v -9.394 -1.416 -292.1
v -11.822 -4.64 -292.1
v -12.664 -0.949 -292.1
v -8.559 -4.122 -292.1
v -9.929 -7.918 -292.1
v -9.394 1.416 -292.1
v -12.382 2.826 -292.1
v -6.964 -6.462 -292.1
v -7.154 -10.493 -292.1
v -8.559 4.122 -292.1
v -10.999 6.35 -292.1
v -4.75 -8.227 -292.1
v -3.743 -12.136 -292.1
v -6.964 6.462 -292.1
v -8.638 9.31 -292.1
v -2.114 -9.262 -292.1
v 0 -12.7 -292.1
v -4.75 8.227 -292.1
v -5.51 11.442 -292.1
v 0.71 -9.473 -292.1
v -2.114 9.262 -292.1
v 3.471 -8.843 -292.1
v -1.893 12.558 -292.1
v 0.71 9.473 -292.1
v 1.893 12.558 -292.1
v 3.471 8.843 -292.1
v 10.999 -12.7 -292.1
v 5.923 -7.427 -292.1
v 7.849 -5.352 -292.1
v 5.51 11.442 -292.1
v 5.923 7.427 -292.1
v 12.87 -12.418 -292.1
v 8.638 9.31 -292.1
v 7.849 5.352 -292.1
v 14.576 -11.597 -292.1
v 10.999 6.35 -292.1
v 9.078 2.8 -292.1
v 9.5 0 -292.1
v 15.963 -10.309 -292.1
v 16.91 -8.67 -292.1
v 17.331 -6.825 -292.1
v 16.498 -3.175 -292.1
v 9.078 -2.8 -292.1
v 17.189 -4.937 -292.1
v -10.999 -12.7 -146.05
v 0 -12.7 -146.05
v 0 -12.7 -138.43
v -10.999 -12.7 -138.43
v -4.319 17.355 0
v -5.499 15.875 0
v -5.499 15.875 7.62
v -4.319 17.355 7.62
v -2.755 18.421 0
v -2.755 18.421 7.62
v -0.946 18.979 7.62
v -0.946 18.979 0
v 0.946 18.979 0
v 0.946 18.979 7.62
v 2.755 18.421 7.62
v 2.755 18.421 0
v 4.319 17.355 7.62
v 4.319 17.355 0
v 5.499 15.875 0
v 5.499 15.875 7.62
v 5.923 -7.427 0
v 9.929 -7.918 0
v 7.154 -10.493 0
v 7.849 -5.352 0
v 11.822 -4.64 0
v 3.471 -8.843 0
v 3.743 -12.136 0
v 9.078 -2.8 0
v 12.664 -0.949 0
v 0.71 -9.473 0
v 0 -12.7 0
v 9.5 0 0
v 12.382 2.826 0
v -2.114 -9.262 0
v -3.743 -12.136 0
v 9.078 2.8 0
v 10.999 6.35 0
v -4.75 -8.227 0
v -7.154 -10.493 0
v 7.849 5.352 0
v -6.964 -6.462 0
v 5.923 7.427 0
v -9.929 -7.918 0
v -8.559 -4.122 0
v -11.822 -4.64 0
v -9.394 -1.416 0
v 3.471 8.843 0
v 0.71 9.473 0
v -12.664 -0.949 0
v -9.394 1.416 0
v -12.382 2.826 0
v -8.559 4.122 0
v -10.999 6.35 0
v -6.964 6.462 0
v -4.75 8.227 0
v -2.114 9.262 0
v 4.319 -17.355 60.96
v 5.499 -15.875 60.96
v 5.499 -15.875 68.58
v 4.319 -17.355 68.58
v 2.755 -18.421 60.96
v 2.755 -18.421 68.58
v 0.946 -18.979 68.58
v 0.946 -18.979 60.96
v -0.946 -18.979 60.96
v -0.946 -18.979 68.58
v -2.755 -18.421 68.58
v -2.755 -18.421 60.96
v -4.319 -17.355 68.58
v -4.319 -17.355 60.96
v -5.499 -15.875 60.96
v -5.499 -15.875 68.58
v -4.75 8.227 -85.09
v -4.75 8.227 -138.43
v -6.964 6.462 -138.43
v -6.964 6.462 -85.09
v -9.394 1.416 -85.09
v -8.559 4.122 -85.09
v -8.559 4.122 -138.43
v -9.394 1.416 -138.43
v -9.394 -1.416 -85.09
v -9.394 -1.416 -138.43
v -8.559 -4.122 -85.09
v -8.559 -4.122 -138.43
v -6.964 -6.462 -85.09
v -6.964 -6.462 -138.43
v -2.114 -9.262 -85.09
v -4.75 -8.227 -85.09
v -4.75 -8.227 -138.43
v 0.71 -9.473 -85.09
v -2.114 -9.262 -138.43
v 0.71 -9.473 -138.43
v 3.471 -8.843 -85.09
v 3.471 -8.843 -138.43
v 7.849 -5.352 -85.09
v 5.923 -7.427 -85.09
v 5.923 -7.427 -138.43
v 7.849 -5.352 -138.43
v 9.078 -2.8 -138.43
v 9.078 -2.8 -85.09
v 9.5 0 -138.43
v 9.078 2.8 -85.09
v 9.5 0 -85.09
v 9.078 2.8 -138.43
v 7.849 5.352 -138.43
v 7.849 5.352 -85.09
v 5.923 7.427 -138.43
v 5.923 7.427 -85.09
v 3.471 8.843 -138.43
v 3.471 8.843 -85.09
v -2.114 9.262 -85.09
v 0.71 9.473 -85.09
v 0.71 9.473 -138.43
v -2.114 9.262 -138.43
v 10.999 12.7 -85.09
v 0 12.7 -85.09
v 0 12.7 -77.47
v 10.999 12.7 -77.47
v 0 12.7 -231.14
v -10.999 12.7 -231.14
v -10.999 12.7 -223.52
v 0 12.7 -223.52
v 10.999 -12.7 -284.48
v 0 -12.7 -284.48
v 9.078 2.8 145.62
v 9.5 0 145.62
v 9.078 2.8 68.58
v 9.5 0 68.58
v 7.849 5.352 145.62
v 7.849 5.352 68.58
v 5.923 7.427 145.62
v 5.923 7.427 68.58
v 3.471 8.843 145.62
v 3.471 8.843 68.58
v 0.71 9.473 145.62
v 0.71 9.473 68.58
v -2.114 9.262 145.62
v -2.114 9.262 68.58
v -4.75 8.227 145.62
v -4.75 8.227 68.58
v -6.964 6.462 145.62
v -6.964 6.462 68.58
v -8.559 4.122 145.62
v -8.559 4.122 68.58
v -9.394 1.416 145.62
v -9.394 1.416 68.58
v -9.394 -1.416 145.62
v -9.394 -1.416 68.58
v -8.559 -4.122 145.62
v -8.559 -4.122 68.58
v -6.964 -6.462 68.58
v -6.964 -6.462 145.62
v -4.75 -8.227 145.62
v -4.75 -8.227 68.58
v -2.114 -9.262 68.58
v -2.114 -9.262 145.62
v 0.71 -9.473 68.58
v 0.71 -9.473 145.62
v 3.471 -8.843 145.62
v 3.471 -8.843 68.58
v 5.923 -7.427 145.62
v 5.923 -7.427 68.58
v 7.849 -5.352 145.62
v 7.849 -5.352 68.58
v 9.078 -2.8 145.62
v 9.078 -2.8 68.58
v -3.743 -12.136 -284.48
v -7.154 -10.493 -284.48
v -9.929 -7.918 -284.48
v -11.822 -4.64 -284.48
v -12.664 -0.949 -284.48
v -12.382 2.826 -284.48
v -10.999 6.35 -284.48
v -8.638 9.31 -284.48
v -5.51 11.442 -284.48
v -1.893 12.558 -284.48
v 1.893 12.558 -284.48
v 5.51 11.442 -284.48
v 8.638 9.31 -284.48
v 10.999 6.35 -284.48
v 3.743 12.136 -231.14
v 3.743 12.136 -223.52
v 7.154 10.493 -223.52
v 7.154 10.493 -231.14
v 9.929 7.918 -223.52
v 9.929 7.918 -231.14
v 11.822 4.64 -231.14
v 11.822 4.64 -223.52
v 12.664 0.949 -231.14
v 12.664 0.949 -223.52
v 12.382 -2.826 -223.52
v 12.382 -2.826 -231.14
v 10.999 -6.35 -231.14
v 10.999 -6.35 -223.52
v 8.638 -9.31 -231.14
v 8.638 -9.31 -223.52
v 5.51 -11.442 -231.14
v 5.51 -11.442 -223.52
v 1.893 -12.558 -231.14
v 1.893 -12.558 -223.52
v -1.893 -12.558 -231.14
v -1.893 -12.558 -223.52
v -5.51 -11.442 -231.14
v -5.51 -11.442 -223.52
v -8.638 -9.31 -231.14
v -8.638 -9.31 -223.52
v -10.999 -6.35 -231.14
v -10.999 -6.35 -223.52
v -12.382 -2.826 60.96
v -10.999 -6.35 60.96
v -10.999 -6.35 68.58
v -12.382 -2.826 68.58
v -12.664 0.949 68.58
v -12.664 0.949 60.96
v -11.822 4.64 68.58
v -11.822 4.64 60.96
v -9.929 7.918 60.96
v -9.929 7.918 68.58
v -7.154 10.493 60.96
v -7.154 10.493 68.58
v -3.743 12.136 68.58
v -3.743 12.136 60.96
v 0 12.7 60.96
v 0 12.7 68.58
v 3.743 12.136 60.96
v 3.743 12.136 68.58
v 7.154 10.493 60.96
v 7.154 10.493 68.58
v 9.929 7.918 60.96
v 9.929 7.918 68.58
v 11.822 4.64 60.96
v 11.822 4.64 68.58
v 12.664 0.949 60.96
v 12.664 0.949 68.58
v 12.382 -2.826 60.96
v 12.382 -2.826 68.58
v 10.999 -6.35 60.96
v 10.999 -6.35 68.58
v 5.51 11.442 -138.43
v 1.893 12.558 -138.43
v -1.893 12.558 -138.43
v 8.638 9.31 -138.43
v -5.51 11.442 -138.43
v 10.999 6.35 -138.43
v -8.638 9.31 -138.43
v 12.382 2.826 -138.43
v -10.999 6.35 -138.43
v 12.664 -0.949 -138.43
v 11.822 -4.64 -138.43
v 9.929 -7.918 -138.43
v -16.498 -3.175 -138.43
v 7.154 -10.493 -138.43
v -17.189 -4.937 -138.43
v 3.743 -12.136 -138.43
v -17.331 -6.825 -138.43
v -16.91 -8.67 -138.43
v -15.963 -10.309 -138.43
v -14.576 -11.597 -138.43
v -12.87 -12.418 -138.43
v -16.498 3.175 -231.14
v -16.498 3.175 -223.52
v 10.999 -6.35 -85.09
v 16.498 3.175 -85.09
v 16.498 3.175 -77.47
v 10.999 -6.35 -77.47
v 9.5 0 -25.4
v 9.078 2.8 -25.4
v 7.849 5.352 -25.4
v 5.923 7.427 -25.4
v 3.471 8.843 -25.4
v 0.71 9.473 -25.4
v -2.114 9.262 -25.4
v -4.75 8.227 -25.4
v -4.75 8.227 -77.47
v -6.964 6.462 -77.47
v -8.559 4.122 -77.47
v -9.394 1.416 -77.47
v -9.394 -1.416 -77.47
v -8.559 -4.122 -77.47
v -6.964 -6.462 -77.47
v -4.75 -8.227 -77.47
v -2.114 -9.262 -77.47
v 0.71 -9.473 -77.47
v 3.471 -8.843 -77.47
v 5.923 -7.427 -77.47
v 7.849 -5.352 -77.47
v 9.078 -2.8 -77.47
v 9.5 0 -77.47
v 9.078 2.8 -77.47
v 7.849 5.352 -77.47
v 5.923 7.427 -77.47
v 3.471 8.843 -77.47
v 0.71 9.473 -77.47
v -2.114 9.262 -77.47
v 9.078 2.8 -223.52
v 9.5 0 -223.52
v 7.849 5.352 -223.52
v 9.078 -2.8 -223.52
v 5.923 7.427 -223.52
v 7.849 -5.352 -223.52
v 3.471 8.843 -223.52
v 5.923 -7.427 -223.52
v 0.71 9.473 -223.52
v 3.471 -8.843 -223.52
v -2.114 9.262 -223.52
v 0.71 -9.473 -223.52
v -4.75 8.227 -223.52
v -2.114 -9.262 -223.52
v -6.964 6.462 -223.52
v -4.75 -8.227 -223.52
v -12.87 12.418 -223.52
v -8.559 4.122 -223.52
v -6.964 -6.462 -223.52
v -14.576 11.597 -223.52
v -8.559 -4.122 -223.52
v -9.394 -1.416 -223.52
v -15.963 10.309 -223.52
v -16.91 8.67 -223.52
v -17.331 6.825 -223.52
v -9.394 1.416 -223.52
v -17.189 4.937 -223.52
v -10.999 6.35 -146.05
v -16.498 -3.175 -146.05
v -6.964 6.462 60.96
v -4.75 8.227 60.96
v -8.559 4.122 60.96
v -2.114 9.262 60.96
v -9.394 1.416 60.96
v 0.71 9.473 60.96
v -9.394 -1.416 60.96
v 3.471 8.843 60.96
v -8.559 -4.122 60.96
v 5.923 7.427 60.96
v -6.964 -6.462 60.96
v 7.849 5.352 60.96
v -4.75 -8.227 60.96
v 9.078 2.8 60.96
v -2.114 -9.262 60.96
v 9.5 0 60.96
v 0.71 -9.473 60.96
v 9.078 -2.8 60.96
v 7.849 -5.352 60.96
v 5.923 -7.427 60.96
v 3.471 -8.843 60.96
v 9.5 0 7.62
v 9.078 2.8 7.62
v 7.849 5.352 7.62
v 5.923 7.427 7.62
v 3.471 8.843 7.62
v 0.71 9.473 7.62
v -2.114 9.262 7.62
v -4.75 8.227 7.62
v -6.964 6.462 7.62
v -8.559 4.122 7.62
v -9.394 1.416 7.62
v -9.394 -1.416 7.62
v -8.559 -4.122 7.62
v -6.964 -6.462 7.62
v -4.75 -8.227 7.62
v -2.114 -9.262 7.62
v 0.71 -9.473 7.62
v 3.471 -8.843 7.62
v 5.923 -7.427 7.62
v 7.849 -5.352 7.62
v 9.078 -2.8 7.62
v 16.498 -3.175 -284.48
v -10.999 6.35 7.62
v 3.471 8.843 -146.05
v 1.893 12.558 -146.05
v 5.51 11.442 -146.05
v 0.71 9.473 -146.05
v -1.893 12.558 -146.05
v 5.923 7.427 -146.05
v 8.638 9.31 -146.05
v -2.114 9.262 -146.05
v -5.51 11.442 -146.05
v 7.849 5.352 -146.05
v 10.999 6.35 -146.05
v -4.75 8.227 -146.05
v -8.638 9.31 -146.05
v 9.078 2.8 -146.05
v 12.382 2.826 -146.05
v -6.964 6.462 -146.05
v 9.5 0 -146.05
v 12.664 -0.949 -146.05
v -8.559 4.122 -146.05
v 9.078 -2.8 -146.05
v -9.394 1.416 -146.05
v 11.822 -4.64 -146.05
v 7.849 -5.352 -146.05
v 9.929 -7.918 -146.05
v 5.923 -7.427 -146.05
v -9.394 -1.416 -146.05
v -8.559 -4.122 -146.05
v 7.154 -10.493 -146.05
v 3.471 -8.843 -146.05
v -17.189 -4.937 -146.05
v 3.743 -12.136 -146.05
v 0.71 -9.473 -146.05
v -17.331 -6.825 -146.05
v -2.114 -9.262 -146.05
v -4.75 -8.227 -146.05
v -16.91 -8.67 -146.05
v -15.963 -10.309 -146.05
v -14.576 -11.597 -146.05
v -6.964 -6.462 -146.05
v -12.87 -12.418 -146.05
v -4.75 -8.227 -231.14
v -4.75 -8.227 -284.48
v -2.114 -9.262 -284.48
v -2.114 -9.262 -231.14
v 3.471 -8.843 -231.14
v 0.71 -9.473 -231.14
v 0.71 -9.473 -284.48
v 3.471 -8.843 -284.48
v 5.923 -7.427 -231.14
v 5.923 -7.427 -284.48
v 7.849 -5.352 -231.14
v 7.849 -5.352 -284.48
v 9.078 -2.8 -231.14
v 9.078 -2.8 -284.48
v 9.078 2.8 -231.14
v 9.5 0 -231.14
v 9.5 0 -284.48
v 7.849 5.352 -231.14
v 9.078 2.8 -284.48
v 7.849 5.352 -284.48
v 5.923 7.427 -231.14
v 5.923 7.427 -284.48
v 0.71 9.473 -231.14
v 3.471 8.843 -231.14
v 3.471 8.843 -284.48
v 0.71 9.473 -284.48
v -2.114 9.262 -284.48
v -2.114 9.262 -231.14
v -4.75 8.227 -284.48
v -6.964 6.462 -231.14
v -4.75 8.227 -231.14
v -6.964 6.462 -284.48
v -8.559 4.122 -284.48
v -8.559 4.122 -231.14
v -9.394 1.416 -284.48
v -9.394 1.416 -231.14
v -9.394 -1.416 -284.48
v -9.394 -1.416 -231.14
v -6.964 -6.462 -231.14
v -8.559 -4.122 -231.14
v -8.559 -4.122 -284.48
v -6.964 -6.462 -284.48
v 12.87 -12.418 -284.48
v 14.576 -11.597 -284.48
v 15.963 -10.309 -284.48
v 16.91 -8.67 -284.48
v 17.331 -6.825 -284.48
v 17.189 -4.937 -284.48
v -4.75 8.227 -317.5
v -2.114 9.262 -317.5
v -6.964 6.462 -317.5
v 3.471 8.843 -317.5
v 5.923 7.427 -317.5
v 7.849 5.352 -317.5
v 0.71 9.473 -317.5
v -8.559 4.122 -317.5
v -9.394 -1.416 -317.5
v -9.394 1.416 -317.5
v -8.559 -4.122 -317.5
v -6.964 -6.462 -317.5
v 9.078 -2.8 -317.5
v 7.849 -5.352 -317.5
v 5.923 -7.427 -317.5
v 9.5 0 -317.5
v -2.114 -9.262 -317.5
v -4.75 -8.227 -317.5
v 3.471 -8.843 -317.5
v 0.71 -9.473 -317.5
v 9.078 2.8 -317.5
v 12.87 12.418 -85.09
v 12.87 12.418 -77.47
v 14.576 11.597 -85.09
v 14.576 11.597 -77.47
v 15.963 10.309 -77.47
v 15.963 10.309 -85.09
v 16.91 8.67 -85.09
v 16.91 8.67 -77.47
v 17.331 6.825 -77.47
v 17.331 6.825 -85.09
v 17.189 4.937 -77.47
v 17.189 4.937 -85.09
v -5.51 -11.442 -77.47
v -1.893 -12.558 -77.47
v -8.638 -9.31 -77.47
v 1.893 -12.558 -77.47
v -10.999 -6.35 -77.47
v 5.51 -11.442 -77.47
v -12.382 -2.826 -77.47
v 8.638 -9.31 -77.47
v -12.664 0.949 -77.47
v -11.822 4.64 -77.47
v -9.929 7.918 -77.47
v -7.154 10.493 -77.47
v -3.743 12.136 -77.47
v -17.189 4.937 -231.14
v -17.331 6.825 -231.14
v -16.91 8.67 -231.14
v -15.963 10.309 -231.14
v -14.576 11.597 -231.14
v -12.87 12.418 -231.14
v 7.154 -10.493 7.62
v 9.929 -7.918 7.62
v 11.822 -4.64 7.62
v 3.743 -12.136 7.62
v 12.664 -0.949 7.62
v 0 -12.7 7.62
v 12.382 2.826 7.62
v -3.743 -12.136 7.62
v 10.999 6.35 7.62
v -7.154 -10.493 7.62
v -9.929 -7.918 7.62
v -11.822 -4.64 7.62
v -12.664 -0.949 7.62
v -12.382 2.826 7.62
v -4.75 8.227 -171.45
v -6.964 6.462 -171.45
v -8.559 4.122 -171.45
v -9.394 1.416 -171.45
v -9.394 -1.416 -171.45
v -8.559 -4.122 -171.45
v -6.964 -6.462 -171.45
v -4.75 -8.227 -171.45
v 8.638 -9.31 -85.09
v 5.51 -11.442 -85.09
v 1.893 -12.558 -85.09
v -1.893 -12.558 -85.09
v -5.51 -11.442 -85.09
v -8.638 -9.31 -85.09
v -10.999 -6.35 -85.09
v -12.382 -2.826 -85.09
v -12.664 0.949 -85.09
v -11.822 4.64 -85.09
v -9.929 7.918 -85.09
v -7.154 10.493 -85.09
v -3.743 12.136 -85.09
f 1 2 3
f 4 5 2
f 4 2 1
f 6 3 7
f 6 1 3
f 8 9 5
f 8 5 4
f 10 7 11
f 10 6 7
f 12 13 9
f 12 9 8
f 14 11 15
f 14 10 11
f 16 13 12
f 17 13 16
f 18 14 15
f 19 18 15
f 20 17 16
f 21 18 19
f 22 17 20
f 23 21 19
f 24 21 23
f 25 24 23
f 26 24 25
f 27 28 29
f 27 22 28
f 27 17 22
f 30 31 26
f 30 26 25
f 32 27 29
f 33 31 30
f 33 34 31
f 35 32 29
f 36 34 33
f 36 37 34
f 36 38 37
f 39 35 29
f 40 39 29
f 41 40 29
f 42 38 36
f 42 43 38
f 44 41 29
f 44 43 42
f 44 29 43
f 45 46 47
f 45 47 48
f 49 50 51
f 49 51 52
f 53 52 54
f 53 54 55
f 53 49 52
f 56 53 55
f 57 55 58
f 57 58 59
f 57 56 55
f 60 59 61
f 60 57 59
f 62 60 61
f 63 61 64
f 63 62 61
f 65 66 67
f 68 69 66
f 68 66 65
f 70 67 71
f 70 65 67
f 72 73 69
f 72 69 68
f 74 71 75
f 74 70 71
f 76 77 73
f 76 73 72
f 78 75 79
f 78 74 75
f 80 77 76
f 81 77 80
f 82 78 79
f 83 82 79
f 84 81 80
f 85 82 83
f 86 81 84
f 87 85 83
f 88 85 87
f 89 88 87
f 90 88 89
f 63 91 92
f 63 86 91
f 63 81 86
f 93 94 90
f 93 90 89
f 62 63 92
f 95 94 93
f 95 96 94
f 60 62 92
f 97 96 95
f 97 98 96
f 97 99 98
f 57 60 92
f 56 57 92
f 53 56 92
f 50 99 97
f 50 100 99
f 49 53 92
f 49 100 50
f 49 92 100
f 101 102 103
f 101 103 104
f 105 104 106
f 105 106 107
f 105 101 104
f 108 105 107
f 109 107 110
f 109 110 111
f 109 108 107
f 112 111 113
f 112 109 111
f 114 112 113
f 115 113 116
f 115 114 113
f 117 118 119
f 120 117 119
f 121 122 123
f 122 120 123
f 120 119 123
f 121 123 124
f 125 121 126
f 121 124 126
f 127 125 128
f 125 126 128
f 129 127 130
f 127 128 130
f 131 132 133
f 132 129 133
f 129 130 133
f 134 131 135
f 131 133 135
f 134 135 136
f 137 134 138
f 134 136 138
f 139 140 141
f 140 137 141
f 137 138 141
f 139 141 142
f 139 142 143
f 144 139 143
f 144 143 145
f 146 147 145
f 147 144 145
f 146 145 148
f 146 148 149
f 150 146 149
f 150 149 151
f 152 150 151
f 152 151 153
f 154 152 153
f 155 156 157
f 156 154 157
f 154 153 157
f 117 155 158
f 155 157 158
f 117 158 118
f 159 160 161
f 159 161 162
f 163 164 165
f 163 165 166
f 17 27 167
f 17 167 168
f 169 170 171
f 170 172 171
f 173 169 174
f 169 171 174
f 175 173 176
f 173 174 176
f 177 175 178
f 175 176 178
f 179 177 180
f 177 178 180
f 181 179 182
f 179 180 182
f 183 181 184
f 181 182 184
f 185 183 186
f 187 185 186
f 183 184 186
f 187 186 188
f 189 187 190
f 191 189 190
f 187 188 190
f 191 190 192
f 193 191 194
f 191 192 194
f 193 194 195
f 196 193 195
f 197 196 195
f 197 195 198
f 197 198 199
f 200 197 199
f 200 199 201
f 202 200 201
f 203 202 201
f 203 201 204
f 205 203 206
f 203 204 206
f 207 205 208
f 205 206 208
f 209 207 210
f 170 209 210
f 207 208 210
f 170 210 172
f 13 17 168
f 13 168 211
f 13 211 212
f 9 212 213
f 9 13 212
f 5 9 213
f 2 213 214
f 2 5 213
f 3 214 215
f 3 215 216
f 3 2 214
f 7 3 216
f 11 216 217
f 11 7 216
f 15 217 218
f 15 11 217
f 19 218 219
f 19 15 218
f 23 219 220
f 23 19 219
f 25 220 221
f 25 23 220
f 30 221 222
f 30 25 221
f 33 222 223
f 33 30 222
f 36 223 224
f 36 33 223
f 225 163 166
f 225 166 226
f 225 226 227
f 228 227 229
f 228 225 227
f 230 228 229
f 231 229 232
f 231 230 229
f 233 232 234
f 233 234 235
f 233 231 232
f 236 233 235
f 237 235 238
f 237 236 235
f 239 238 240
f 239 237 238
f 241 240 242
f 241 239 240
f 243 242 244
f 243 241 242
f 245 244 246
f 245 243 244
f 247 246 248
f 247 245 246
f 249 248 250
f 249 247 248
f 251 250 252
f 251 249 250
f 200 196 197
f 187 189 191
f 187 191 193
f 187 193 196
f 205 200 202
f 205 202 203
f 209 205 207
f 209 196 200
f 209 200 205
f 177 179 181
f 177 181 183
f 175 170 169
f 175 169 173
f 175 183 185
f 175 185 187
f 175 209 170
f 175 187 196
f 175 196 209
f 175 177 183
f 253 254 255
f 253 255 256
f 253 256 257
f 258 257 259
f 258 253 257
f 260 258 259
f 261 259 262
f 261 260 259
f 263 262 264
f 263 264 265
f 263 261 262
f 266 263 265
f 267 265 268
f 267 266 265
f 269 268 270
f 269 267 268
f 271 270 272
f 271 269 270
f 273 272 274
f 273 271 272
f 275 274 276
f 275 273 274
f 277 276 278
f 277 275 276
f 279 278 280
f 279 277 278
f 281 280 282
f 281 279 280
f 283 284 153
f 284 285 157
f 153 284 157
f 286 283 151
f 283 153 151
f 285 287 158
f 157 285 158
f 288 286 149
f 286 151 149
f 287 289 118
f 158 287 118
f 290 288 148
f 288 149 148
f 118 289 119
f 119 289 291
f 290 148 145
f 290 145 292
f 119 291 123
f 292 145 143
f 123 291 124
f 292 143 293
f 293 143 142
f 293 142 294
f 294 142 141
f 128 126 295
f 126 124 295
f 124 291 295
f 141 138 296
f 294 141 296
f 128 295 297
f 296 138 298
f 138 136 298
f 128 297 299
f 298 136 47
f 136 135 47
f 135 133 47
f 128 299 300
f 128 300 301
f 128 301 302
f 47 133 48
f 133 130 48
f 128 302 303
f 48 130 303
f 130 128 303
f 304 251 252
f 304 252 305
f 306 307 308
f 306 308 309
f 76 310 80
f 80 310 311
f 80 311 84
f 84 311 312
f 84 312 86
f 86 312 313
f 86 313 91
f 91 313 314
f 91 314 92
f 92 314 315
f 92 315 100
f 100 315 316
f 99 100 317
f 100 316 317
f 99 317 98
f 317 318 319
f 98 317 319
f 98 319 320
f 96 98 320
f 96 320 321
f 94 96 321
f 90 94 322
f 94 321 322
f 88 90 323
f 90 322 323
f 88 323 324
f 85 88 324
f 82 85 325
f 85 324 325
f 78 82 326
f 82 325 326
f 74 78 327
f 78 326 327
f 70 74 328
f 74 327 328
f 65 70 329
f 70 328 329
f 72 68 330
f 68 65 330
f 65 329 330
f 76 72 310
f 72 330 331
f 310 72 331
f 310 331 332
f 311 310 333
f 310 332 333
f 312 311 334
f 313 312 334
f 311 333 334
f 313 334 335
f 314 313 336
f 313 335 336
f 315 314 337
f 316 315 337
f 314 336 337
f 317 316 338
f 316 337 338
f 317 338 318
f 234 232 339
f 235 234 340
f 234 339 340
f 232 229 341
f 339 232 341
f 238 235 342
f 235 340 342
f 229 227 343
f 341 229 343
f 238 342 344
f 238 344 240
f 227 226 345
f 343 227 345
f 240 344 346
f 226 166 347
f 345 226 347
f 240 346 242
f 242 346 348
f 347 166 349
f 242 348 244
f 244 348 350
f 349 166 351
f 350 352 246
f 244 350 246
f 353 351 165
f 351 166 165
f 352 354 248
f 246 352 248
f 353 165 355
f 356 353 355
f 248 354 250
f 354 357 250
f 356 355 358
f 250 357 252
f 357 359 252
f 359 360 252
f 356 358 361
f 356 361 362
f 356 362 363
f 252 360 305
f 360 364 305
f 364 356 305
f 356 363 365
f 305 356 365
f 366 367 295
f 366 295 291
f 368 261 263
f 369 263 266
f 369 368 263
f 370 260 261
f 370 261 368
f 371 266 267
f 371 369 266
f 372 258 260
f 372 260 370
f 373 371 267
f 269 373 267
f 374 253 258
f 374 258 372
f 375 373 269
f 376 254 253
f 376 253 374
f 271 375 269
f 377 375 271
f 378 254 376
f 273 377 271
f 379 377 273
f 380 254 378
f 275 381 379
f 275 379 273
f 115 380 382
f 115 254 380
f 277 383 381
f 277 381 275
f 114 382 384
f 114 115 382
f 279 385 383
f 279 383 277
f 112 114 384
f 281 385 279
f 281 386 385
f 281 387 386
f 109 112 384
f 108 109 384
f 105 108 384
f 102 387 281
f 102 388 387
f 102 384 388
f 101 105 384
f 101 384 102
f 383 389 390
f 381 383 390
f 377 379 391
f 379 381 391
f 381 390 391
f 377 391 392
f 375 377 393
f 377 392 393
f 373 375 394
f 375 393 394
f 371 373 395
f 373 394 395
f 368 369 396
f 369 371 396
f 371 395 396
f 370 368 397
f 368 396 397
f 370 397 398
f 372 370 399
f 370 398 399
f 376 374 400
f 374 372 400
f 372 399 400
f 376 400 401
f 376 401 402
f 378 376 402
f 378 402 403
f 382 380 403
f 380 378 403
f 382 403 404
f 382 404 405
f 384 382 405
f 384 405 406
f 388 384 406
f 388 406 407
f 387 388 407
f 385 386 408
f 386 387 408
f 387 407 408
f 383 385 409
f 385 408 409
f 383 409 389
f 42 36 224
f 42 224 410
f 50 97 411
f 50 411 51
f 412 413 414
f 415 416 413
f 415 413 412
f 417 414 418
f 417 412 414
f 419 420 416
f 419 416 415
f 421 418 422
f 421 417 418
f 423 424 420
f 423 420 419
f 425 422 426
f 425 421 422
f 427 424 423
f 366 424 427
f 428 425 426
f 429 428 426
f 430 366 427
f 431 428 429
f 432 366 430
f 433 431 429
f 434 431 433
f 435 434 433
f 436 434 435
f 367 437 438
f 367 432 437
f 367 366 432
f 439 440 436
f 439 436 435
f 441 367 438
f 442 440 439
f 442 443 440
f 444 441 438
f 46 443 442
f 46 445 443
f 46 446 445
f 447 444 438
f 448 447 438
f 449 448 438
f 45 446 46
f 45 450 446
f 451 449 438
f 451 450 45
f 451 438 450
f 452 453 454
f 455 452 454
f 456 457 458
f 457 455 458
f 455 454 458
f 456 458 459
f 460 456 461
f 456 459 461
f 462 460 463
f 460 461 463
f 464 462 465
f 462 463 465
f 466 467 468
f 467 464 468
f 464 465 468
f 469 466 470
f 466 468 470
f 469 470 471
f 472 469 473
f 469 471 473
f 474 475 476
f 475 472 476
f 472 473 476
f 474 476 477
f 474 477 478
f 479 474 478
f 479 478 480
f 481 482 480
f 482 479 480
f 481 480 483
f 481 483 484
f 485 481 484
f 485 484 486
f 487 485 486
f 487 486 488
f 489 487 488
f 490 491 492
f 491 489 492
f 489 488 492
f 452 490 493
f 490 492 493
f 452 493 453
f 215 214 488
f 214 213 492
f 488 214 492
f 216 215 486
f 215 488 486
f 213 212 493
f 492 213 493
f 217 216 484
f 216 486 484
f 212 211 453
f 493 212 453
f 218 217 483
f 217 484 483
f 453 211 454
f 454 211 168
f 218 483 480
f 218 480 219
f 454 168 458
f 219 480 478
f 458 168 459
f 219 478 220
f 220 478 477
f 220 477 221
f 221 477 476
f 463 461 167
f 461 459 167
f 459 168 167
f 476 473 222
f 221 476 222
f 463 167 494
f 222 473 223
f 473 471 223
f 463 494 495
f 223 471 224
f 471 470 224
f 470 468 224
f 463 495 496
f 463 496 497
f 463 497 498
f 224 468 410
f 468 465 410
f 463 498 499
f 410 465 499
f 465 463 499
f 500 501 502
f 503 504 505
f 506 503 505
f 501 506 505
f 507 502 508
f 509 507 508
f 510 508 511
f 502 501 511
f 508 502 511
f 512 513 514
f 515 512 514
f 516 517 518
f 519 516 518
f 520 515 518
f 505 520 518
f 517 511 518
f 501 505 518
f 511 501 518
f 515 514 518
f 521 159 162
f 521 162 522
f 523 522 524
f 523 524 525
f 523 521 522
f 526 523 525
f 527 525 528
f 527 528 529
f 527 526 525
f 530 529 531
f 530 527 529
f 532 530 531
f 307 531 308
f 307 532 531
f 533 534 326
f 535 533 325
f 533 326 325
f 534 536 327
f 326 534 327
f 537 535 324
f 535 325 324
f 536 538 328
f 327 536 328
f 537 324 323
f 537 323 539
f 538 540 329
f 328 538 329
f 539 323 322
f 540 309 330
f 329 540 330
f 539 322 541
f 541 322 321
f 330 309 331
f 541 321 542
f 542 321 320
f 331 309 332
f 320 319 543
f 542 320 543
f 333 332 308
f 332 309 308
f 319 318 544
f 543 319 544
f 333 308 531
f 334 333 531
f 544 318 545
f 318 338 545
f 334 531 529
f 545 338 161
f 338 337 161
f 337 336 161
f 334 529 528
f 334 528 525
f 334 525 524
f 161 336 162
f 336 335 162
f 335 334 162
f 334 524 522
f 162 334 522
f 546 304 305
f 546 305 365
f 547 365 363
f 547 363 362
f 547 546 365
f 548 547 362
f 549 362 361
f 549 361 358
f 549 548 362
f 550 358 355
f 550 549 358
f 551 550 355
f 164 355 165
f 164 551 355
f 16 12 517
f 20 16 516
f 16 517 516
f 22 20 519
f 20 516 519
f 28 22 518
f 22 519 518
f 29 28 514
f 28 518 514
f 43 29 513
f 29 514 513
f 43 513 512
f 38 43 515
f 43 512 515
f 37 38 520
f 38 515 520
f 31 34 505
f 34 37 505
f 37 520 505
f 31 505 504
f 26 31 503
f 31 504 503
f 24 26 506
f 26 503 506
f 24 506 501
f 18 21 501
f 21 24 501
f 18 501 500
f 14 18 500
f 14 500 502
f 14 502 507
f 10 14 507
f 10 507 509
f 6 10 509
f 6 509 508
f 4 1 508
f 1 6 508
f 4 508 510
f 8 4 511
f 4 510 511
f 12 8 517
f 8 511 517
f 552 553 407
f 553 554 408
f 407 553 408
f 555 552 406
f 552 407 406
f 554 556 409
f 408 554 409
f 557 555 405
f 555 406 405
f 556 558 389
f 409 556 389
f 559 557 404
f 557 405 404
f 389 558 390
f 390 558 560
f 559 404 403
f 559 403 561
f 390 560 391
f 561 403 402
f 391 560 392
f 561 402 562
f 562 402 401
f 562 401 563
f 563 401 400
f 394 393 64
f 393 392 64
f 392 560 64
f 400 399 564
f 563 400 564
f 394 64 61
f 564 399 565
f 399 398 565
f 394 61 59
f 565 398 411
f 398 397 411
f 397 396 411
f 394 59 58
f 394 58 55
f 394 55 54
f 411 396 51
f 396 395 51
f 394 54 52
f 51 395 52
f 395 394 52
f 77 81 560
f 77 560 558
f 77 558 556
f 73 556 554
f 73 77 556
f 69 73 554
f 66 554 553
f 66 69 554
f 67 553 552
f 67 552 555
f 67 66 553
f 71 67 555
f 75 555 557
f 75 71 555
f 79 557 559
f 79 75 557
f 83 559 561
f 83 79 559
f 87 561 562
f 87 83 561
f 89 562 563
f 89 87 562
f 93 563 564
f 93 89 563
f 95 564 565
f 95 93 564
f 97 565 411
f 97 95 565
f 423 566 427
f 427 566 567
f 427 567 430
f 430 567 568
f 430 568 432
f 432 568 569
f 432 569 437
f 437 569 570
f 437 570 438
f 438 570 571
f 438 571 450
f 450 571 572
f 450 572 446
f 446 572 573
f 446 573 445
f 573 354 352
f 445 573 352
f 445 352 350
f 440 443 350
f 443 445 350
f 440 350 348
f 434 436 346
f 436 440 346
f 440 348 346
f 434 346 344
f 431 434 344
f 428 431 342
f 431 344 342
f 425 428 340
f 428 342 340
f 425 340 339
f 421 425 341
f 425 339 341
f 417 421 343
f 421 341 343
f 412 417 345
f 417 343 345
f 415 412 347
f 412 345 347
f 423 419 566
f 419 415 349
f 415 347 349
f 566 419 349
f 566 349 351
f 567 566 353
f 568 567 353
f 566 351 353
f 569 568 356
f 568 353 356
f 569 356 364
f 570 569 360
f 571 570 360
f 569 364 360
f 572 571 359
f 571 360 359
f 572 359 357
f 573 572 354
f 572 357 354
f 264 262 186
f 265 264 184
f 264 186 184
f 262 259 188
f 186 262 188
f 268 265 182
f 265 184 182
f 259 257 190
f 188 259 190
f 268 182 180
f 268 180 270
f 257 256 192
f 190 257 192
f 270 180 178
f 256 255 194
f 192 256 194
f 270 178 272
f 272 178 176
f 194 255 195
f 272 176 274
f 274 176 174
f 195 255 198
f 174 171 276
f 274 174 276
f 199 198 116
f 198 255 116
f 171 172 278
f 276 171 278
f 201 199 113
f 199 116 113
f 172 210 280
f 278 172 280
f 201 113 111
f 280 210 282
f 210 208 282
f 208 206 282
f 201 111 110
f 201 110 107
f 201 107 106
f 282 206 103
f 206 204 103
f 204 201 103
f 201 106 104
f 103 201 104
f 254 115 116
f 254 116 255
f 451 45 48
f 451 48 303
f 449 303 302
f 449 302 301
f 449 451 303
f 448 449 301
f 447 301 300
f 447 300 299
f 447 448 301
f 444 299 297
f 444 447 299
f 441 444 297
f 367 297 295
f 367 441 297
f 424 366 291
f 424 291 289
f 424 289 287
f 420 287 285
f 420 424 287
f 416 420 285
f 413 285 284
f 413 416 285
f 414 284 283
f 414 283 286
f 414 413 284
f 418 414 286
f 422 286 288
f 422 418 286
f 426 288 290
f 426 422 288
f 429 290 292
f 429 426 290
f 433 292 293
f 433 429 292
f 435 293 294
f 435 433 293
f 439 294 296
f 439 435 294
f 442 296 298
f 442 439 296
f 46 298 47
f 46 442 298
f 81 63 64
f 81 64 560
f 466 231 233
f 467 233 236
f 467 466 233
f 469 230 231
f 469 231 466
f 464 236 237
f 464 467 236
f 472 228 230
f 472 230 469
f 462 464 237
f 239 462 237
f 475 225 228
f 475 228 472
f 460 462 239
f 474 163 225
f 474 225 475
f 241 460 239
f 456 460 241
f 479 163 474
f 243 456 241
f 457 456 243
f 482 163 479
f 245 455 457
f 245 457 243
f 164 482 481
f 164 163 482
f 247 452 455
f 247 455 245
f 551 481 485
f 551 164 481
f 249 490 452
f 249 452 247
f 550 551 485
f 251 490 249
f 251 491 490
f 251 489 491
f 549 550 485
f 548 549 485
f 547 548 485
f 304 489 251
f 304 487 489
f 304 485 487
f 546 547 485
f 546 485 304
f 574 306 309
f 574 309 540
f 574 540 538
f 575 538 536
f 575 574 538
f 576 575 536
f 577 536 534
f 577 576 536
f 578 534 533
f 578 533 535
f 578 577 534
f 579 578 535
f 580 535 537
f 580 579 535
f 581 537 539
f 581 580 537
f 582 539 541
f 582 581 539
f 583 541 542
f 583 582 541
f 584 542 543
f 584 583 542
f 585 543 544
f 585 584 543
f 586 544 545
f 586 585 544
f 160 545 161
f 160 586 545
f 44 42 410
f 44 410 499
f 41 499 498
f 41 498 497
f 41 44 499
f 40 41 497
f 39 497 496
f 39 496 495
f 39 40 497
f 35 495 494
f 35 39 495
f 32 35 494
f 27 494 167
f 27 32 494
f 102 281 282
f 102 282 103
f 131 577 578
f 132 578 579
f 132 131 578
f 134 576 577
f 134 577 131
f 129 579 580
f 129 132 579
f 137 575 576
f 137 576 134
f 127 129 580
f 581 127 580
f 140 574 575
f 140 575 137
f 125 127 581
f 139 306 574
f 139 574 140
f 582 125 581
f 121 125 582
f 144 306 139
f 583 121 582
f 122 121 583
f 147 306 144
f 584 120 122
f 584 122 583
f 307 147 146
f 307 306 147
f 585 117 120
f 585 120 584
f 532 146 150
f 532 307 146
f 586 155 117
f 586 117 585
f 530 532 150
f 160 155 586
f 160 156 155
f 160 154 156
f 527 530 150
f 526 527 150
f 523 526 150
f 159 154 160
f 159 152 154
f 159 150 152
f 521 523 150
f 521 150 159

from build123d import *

# Parameters (mm, degrees)
ESTRUSIONE_ESTRUSIONE1_DEPTH = 7.62
CORPO_SPOSTA_COPIA8_ANGLE    = 180
ESTRUSIONE_ESTRUSIONE4_START = -25.4
SCHIZZO11_R                  = 9.5
ESTRUSIONE_ESTRUSIONE4_DEPTH = 146.05
RIPETIZIONE_A_L1_COUNT       = 3
RIPETIZIONE_A_L1_PITCH       = 146.05
CORPO_SPOSTA_COPIA9_ANGLE    = 120
CORPO_SPOSTA_COPIA10_ANGLE   = 120
SCHIZZO12_R                  = 9.5
ESTRUSIONE_ESTRUSIONE5_DEPTH = 24.97


with BuildPart() as part:
    # Schizzo4 → Estrusione-Estrusione1 (new body)
    with BuildSketch(Plane.XY):
        with BuildLine():
            Line((5.499261314, 15.875), (10.998522628, 6.35))
            ThreePointArc((10.998522628, 6.35), (0, -12.7), (-10.998522628, 6.35))
            Line((-10.998522628, 6.35), (-5.499261314, 15.875))
            ThreePointArc((-5.499261314, 15.875), (0, 19.05), (5.499261314, 15.875))
        make_face()
    extrude(amount=ESTRUSIONE_ESTRUSIONE1_DEPTH)


with BuildPart() as body_2:
    # Corpo-Sposta/copia7: copy of part
    add(part.part.moved(Location((0, 0, 60.96))))


with BuildPart() as body_2_1:
    # Corpo-Sposta/copia8: moved
    add(body_2.part.rotate(Axis((0, 0, 0), (0, 0, 1)), CORPO_SPOSTA_COPIA8_ANGLE))


with BuildPart() as part_1:
    add(part.part)

    add(body_2_1.part)  # Estrusione-Estrusione4 merges body 2
    # Schizzo11 → Estrusione-Estrusione4 (add)
    with BuildSketch(Plane.XY.offset(ESTRUSIONE_ESTRUSIONE4_START)):
        Circle(SCHIZZO11_R)
    extrude(amount=ESTRUSIONE_ESTRUSIONE4_DEPTH)


with BuildPart() as ripetizione_a_l1_1:
    # Ripetizione a L1: pattern copy
    add(part_1.part.moved(Location(Vector(0, 0, -1) * (1 * RIPETIZIONE_A_L1_PITCH))))


with BuildPart() as ripetizione_a_l1_2:
    # Ripetizione a L1: pattern copy
    add(part_1.part.moved(Location(Vector(0, 0, -1) * (2 * RIPETIZIONE_A_L1_PITCH))))


with BuildPart() as ripetizione_a_l1_1_1:
    # Corpo-Sposta/copia9: moved
    add(ripetizione_a_l1_1.part.rotate(Axis((0, 0, 0), (0, 0, 1)), CORPO_SPOSTA_COPIA9_ANGLE))


with BuildPart() as ripetizione_a_l1_2_1:
    # Corpo-Sposta/copia10: moved
    add(ripetizione_a_l1_2.part.rotate(Axis((0, 0, 0), (0, 0, -1)), CORPO_SPOSTA_COPIA10_ANGLE))


with BuildPart() as part_2:
    add(part_1.part)

    # Schizzo12 → Estrusione-Estrusione5 (add)
    with BuildSketch(Plane.XY.offset(120.65)):
        Circle(SCHIZZO12_R)
    extrude(amount=ESTRUSIONE_ESTRUSIONE5_DEPTH)


with BuildPart() as ripetizione_a_l1_2_2:
    add(ripetizione_a_l1_2_1.part)

    # Abbina1: union Ripetizione a L1_1, part
    add(ripetizione_a_l1_1_1.part)
    add(part_2.part)


solid = ripetizione_a_l1_2_2.part
